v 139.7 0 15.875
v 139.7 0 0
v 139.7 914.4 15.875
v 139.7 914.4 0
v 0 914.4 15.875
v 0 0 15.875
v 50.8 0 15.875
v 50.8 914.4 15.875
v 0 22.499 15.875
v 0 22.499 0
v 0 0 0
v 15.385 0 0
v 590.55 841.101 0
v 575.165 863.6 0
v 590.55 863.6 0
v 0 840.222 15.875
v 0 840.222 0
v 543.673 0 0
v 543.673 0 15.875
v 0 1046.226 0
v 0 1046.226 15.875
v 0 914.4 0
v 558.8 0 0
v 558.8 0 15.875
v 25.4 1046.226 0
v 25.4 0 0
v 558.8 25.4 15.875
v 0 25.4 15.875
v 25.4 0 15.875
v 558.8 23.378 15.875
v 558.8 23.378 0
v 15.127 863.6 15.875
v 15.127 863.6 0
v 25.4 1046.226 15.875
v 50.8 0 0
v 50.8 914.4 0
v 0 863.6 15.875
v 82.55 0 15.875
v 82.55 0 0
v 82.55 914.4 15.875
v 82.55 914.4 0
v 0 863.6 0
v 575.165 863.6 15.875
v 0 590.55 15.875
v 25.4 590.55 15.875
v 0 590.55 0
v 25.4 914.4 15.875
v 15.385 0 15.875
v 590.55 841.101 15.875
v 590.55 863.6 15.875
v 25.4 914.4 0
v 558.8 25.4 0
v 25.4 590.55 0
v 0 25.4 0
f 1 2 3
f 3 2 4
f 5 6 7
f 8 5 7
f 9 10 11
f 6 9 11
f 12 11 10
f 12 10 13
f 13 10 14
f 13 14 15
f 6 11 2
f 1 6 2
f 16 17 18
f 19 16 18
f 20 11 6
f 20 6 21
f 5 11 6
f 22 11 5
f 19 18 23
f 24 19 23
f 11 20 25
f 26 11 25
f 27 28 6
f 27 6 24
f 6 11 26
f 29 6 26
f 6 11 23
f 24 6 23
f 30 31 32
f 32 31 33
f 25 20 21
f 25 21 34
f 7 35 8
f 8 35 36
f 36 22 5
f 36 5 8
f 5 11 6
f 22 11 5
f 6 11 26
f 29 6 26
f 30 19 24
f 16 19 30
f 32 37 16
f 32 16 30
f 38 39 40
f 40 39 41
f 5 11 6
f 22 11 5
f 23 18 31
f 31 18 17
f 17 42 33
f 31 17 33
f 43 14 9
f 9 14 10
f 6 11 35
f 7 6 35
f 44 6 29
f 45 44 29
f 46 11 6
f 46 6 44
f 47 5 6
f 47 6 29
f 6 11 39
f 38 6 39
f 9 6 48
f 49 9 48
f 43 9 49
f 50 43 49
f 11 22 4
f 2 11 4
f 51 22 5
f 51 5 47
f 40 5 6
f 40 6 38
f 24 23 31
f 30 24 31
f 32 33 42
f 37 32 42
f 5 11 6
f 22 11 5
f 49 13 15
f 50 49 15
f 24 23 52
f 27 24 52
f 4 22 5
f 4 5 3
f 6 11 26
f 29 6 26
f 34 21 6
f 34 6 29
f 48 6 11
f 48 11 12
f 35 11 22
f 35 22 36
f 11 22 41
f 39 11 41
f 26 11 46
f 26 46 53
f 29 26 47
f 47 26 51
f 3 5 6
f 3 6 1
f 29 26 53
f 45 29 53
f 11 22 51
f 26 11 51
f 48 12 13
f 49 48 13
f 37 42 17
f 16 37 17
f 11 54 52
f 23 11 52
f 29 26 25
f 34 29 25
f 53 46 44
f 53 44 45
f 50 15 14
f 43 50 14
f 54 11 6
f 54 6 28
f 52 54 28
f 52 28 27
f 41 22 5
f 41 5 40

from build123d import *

# Parameters (mm, degrees)
F0_W      = 139.7
F0_H      = 914.4
F1_DEPTH  = 15.875
F2_W      = 82.55
F2_H      = 914.4
F3_DEPTH  = 15.875
F4_W      = 50.8
F4_H      = 914.4
F5_DEPTH  = 15.875
F6_W      = 25.4
F6_H      = 914.4
F7_DEPTH  = 15.875
F8_W      = 25.4
F8_H      = 590.55
F9_DEPTH  = 15.875
F10_W     = 25.4
F10_H     = 1046.226
F11_DEPTH = 15.875
F13_DEPTH = 15.875
F14_W     = 558.8
F14_H     = 25.4
F15_DEPTH = 15.875
F17_DEPTH = 15.875


with BuildPart() as f1:
    # F0 (on Top) → F1 (new body)
    with BuildSketch(Plane.XY):
        with Locations((69.85, 457.2)):
            Rectangle(F0_W, F0_H)
    extrude(amount=F1_DEPTH)


with BuildPart() as f3:
    # F2 (on Top) → F3 (new body)
    with BuildSketch(Plane.XY):
        with Locations((41.275, 457.2)):
            Rectangle(F2_W, F2_H)
    extrude(amount=F3_DEPTH)


with BuildPart() as f5:
    # F4 (on Top) → F5 (new body)
    with BuildSketch(Plane.XY):
        with Locations((25.4, 457.2)):
            Rectangle(F4_W, F4_H)
    extrude(amount=F5_DEPTH)


with BuildPart() as f7:
    # F6 (on Top) → F7 (new body)
    with BuildSketch(Plane.XY):
        with Locations((12.7, 457.2)):
            Rectangle(F6_W, F6_H)
    extrude(amount=F7_DEPTH)


with BuildPart() as f9:
    # F8 (on Top) → F9 (new body)
    with BuildSketch(Plane.XY):
        with Locations((12.7, 295.275)):
            Rectangle(F8_W, F8_H)
    extrude(amount=F9_DEPTH)


with BuildPart() as f11:
    # F10 (on Top) → F11 (new body)
    with BuildSketch(Plane.XY):
        with Locations((12.7, 523.113)):
            Rectangle(F10_W, F10_H)
    extrude(amount=F11_DEPTH)


with BuildPart() as f13:
    # F12 (on Top) → F13 (new body)
    with BuildSketch(Plane.XY):
        Polygon((575.164567, 863.6), (0, 22.499128), (0, 0), (15.385433, 0), (590.55, 841.100872), (590.55, 863.6), align=None)
    extrude(amount=F13_DEPTH)


with BuildPart() as f15:
    # F14 (on Top) → F15 (new body)
    with BuildSketch(Plane.XY):
        with Locations((279.4, 12.7)):
            Rectangle(F14_W, F14_H)
    extrude(amount=F15_DEPTH)


with BuildPart() as f17:
    # F16 (on Top) → F17 (new body)
    with BuildSketch(Plane.XY):
        Polygon((0, 863.6), (0, 840.222236), (543.673212, 0), (558.8, 0), (558.8, 23.377764), (15.126788, 863.6), align=None)
    extrude(amount=F17_DEPTH)


solid = Compound([f1.part, f3.part, f5.part, f7.part, f9.part, f11.part, f13.part, f15.part, f17.part])
